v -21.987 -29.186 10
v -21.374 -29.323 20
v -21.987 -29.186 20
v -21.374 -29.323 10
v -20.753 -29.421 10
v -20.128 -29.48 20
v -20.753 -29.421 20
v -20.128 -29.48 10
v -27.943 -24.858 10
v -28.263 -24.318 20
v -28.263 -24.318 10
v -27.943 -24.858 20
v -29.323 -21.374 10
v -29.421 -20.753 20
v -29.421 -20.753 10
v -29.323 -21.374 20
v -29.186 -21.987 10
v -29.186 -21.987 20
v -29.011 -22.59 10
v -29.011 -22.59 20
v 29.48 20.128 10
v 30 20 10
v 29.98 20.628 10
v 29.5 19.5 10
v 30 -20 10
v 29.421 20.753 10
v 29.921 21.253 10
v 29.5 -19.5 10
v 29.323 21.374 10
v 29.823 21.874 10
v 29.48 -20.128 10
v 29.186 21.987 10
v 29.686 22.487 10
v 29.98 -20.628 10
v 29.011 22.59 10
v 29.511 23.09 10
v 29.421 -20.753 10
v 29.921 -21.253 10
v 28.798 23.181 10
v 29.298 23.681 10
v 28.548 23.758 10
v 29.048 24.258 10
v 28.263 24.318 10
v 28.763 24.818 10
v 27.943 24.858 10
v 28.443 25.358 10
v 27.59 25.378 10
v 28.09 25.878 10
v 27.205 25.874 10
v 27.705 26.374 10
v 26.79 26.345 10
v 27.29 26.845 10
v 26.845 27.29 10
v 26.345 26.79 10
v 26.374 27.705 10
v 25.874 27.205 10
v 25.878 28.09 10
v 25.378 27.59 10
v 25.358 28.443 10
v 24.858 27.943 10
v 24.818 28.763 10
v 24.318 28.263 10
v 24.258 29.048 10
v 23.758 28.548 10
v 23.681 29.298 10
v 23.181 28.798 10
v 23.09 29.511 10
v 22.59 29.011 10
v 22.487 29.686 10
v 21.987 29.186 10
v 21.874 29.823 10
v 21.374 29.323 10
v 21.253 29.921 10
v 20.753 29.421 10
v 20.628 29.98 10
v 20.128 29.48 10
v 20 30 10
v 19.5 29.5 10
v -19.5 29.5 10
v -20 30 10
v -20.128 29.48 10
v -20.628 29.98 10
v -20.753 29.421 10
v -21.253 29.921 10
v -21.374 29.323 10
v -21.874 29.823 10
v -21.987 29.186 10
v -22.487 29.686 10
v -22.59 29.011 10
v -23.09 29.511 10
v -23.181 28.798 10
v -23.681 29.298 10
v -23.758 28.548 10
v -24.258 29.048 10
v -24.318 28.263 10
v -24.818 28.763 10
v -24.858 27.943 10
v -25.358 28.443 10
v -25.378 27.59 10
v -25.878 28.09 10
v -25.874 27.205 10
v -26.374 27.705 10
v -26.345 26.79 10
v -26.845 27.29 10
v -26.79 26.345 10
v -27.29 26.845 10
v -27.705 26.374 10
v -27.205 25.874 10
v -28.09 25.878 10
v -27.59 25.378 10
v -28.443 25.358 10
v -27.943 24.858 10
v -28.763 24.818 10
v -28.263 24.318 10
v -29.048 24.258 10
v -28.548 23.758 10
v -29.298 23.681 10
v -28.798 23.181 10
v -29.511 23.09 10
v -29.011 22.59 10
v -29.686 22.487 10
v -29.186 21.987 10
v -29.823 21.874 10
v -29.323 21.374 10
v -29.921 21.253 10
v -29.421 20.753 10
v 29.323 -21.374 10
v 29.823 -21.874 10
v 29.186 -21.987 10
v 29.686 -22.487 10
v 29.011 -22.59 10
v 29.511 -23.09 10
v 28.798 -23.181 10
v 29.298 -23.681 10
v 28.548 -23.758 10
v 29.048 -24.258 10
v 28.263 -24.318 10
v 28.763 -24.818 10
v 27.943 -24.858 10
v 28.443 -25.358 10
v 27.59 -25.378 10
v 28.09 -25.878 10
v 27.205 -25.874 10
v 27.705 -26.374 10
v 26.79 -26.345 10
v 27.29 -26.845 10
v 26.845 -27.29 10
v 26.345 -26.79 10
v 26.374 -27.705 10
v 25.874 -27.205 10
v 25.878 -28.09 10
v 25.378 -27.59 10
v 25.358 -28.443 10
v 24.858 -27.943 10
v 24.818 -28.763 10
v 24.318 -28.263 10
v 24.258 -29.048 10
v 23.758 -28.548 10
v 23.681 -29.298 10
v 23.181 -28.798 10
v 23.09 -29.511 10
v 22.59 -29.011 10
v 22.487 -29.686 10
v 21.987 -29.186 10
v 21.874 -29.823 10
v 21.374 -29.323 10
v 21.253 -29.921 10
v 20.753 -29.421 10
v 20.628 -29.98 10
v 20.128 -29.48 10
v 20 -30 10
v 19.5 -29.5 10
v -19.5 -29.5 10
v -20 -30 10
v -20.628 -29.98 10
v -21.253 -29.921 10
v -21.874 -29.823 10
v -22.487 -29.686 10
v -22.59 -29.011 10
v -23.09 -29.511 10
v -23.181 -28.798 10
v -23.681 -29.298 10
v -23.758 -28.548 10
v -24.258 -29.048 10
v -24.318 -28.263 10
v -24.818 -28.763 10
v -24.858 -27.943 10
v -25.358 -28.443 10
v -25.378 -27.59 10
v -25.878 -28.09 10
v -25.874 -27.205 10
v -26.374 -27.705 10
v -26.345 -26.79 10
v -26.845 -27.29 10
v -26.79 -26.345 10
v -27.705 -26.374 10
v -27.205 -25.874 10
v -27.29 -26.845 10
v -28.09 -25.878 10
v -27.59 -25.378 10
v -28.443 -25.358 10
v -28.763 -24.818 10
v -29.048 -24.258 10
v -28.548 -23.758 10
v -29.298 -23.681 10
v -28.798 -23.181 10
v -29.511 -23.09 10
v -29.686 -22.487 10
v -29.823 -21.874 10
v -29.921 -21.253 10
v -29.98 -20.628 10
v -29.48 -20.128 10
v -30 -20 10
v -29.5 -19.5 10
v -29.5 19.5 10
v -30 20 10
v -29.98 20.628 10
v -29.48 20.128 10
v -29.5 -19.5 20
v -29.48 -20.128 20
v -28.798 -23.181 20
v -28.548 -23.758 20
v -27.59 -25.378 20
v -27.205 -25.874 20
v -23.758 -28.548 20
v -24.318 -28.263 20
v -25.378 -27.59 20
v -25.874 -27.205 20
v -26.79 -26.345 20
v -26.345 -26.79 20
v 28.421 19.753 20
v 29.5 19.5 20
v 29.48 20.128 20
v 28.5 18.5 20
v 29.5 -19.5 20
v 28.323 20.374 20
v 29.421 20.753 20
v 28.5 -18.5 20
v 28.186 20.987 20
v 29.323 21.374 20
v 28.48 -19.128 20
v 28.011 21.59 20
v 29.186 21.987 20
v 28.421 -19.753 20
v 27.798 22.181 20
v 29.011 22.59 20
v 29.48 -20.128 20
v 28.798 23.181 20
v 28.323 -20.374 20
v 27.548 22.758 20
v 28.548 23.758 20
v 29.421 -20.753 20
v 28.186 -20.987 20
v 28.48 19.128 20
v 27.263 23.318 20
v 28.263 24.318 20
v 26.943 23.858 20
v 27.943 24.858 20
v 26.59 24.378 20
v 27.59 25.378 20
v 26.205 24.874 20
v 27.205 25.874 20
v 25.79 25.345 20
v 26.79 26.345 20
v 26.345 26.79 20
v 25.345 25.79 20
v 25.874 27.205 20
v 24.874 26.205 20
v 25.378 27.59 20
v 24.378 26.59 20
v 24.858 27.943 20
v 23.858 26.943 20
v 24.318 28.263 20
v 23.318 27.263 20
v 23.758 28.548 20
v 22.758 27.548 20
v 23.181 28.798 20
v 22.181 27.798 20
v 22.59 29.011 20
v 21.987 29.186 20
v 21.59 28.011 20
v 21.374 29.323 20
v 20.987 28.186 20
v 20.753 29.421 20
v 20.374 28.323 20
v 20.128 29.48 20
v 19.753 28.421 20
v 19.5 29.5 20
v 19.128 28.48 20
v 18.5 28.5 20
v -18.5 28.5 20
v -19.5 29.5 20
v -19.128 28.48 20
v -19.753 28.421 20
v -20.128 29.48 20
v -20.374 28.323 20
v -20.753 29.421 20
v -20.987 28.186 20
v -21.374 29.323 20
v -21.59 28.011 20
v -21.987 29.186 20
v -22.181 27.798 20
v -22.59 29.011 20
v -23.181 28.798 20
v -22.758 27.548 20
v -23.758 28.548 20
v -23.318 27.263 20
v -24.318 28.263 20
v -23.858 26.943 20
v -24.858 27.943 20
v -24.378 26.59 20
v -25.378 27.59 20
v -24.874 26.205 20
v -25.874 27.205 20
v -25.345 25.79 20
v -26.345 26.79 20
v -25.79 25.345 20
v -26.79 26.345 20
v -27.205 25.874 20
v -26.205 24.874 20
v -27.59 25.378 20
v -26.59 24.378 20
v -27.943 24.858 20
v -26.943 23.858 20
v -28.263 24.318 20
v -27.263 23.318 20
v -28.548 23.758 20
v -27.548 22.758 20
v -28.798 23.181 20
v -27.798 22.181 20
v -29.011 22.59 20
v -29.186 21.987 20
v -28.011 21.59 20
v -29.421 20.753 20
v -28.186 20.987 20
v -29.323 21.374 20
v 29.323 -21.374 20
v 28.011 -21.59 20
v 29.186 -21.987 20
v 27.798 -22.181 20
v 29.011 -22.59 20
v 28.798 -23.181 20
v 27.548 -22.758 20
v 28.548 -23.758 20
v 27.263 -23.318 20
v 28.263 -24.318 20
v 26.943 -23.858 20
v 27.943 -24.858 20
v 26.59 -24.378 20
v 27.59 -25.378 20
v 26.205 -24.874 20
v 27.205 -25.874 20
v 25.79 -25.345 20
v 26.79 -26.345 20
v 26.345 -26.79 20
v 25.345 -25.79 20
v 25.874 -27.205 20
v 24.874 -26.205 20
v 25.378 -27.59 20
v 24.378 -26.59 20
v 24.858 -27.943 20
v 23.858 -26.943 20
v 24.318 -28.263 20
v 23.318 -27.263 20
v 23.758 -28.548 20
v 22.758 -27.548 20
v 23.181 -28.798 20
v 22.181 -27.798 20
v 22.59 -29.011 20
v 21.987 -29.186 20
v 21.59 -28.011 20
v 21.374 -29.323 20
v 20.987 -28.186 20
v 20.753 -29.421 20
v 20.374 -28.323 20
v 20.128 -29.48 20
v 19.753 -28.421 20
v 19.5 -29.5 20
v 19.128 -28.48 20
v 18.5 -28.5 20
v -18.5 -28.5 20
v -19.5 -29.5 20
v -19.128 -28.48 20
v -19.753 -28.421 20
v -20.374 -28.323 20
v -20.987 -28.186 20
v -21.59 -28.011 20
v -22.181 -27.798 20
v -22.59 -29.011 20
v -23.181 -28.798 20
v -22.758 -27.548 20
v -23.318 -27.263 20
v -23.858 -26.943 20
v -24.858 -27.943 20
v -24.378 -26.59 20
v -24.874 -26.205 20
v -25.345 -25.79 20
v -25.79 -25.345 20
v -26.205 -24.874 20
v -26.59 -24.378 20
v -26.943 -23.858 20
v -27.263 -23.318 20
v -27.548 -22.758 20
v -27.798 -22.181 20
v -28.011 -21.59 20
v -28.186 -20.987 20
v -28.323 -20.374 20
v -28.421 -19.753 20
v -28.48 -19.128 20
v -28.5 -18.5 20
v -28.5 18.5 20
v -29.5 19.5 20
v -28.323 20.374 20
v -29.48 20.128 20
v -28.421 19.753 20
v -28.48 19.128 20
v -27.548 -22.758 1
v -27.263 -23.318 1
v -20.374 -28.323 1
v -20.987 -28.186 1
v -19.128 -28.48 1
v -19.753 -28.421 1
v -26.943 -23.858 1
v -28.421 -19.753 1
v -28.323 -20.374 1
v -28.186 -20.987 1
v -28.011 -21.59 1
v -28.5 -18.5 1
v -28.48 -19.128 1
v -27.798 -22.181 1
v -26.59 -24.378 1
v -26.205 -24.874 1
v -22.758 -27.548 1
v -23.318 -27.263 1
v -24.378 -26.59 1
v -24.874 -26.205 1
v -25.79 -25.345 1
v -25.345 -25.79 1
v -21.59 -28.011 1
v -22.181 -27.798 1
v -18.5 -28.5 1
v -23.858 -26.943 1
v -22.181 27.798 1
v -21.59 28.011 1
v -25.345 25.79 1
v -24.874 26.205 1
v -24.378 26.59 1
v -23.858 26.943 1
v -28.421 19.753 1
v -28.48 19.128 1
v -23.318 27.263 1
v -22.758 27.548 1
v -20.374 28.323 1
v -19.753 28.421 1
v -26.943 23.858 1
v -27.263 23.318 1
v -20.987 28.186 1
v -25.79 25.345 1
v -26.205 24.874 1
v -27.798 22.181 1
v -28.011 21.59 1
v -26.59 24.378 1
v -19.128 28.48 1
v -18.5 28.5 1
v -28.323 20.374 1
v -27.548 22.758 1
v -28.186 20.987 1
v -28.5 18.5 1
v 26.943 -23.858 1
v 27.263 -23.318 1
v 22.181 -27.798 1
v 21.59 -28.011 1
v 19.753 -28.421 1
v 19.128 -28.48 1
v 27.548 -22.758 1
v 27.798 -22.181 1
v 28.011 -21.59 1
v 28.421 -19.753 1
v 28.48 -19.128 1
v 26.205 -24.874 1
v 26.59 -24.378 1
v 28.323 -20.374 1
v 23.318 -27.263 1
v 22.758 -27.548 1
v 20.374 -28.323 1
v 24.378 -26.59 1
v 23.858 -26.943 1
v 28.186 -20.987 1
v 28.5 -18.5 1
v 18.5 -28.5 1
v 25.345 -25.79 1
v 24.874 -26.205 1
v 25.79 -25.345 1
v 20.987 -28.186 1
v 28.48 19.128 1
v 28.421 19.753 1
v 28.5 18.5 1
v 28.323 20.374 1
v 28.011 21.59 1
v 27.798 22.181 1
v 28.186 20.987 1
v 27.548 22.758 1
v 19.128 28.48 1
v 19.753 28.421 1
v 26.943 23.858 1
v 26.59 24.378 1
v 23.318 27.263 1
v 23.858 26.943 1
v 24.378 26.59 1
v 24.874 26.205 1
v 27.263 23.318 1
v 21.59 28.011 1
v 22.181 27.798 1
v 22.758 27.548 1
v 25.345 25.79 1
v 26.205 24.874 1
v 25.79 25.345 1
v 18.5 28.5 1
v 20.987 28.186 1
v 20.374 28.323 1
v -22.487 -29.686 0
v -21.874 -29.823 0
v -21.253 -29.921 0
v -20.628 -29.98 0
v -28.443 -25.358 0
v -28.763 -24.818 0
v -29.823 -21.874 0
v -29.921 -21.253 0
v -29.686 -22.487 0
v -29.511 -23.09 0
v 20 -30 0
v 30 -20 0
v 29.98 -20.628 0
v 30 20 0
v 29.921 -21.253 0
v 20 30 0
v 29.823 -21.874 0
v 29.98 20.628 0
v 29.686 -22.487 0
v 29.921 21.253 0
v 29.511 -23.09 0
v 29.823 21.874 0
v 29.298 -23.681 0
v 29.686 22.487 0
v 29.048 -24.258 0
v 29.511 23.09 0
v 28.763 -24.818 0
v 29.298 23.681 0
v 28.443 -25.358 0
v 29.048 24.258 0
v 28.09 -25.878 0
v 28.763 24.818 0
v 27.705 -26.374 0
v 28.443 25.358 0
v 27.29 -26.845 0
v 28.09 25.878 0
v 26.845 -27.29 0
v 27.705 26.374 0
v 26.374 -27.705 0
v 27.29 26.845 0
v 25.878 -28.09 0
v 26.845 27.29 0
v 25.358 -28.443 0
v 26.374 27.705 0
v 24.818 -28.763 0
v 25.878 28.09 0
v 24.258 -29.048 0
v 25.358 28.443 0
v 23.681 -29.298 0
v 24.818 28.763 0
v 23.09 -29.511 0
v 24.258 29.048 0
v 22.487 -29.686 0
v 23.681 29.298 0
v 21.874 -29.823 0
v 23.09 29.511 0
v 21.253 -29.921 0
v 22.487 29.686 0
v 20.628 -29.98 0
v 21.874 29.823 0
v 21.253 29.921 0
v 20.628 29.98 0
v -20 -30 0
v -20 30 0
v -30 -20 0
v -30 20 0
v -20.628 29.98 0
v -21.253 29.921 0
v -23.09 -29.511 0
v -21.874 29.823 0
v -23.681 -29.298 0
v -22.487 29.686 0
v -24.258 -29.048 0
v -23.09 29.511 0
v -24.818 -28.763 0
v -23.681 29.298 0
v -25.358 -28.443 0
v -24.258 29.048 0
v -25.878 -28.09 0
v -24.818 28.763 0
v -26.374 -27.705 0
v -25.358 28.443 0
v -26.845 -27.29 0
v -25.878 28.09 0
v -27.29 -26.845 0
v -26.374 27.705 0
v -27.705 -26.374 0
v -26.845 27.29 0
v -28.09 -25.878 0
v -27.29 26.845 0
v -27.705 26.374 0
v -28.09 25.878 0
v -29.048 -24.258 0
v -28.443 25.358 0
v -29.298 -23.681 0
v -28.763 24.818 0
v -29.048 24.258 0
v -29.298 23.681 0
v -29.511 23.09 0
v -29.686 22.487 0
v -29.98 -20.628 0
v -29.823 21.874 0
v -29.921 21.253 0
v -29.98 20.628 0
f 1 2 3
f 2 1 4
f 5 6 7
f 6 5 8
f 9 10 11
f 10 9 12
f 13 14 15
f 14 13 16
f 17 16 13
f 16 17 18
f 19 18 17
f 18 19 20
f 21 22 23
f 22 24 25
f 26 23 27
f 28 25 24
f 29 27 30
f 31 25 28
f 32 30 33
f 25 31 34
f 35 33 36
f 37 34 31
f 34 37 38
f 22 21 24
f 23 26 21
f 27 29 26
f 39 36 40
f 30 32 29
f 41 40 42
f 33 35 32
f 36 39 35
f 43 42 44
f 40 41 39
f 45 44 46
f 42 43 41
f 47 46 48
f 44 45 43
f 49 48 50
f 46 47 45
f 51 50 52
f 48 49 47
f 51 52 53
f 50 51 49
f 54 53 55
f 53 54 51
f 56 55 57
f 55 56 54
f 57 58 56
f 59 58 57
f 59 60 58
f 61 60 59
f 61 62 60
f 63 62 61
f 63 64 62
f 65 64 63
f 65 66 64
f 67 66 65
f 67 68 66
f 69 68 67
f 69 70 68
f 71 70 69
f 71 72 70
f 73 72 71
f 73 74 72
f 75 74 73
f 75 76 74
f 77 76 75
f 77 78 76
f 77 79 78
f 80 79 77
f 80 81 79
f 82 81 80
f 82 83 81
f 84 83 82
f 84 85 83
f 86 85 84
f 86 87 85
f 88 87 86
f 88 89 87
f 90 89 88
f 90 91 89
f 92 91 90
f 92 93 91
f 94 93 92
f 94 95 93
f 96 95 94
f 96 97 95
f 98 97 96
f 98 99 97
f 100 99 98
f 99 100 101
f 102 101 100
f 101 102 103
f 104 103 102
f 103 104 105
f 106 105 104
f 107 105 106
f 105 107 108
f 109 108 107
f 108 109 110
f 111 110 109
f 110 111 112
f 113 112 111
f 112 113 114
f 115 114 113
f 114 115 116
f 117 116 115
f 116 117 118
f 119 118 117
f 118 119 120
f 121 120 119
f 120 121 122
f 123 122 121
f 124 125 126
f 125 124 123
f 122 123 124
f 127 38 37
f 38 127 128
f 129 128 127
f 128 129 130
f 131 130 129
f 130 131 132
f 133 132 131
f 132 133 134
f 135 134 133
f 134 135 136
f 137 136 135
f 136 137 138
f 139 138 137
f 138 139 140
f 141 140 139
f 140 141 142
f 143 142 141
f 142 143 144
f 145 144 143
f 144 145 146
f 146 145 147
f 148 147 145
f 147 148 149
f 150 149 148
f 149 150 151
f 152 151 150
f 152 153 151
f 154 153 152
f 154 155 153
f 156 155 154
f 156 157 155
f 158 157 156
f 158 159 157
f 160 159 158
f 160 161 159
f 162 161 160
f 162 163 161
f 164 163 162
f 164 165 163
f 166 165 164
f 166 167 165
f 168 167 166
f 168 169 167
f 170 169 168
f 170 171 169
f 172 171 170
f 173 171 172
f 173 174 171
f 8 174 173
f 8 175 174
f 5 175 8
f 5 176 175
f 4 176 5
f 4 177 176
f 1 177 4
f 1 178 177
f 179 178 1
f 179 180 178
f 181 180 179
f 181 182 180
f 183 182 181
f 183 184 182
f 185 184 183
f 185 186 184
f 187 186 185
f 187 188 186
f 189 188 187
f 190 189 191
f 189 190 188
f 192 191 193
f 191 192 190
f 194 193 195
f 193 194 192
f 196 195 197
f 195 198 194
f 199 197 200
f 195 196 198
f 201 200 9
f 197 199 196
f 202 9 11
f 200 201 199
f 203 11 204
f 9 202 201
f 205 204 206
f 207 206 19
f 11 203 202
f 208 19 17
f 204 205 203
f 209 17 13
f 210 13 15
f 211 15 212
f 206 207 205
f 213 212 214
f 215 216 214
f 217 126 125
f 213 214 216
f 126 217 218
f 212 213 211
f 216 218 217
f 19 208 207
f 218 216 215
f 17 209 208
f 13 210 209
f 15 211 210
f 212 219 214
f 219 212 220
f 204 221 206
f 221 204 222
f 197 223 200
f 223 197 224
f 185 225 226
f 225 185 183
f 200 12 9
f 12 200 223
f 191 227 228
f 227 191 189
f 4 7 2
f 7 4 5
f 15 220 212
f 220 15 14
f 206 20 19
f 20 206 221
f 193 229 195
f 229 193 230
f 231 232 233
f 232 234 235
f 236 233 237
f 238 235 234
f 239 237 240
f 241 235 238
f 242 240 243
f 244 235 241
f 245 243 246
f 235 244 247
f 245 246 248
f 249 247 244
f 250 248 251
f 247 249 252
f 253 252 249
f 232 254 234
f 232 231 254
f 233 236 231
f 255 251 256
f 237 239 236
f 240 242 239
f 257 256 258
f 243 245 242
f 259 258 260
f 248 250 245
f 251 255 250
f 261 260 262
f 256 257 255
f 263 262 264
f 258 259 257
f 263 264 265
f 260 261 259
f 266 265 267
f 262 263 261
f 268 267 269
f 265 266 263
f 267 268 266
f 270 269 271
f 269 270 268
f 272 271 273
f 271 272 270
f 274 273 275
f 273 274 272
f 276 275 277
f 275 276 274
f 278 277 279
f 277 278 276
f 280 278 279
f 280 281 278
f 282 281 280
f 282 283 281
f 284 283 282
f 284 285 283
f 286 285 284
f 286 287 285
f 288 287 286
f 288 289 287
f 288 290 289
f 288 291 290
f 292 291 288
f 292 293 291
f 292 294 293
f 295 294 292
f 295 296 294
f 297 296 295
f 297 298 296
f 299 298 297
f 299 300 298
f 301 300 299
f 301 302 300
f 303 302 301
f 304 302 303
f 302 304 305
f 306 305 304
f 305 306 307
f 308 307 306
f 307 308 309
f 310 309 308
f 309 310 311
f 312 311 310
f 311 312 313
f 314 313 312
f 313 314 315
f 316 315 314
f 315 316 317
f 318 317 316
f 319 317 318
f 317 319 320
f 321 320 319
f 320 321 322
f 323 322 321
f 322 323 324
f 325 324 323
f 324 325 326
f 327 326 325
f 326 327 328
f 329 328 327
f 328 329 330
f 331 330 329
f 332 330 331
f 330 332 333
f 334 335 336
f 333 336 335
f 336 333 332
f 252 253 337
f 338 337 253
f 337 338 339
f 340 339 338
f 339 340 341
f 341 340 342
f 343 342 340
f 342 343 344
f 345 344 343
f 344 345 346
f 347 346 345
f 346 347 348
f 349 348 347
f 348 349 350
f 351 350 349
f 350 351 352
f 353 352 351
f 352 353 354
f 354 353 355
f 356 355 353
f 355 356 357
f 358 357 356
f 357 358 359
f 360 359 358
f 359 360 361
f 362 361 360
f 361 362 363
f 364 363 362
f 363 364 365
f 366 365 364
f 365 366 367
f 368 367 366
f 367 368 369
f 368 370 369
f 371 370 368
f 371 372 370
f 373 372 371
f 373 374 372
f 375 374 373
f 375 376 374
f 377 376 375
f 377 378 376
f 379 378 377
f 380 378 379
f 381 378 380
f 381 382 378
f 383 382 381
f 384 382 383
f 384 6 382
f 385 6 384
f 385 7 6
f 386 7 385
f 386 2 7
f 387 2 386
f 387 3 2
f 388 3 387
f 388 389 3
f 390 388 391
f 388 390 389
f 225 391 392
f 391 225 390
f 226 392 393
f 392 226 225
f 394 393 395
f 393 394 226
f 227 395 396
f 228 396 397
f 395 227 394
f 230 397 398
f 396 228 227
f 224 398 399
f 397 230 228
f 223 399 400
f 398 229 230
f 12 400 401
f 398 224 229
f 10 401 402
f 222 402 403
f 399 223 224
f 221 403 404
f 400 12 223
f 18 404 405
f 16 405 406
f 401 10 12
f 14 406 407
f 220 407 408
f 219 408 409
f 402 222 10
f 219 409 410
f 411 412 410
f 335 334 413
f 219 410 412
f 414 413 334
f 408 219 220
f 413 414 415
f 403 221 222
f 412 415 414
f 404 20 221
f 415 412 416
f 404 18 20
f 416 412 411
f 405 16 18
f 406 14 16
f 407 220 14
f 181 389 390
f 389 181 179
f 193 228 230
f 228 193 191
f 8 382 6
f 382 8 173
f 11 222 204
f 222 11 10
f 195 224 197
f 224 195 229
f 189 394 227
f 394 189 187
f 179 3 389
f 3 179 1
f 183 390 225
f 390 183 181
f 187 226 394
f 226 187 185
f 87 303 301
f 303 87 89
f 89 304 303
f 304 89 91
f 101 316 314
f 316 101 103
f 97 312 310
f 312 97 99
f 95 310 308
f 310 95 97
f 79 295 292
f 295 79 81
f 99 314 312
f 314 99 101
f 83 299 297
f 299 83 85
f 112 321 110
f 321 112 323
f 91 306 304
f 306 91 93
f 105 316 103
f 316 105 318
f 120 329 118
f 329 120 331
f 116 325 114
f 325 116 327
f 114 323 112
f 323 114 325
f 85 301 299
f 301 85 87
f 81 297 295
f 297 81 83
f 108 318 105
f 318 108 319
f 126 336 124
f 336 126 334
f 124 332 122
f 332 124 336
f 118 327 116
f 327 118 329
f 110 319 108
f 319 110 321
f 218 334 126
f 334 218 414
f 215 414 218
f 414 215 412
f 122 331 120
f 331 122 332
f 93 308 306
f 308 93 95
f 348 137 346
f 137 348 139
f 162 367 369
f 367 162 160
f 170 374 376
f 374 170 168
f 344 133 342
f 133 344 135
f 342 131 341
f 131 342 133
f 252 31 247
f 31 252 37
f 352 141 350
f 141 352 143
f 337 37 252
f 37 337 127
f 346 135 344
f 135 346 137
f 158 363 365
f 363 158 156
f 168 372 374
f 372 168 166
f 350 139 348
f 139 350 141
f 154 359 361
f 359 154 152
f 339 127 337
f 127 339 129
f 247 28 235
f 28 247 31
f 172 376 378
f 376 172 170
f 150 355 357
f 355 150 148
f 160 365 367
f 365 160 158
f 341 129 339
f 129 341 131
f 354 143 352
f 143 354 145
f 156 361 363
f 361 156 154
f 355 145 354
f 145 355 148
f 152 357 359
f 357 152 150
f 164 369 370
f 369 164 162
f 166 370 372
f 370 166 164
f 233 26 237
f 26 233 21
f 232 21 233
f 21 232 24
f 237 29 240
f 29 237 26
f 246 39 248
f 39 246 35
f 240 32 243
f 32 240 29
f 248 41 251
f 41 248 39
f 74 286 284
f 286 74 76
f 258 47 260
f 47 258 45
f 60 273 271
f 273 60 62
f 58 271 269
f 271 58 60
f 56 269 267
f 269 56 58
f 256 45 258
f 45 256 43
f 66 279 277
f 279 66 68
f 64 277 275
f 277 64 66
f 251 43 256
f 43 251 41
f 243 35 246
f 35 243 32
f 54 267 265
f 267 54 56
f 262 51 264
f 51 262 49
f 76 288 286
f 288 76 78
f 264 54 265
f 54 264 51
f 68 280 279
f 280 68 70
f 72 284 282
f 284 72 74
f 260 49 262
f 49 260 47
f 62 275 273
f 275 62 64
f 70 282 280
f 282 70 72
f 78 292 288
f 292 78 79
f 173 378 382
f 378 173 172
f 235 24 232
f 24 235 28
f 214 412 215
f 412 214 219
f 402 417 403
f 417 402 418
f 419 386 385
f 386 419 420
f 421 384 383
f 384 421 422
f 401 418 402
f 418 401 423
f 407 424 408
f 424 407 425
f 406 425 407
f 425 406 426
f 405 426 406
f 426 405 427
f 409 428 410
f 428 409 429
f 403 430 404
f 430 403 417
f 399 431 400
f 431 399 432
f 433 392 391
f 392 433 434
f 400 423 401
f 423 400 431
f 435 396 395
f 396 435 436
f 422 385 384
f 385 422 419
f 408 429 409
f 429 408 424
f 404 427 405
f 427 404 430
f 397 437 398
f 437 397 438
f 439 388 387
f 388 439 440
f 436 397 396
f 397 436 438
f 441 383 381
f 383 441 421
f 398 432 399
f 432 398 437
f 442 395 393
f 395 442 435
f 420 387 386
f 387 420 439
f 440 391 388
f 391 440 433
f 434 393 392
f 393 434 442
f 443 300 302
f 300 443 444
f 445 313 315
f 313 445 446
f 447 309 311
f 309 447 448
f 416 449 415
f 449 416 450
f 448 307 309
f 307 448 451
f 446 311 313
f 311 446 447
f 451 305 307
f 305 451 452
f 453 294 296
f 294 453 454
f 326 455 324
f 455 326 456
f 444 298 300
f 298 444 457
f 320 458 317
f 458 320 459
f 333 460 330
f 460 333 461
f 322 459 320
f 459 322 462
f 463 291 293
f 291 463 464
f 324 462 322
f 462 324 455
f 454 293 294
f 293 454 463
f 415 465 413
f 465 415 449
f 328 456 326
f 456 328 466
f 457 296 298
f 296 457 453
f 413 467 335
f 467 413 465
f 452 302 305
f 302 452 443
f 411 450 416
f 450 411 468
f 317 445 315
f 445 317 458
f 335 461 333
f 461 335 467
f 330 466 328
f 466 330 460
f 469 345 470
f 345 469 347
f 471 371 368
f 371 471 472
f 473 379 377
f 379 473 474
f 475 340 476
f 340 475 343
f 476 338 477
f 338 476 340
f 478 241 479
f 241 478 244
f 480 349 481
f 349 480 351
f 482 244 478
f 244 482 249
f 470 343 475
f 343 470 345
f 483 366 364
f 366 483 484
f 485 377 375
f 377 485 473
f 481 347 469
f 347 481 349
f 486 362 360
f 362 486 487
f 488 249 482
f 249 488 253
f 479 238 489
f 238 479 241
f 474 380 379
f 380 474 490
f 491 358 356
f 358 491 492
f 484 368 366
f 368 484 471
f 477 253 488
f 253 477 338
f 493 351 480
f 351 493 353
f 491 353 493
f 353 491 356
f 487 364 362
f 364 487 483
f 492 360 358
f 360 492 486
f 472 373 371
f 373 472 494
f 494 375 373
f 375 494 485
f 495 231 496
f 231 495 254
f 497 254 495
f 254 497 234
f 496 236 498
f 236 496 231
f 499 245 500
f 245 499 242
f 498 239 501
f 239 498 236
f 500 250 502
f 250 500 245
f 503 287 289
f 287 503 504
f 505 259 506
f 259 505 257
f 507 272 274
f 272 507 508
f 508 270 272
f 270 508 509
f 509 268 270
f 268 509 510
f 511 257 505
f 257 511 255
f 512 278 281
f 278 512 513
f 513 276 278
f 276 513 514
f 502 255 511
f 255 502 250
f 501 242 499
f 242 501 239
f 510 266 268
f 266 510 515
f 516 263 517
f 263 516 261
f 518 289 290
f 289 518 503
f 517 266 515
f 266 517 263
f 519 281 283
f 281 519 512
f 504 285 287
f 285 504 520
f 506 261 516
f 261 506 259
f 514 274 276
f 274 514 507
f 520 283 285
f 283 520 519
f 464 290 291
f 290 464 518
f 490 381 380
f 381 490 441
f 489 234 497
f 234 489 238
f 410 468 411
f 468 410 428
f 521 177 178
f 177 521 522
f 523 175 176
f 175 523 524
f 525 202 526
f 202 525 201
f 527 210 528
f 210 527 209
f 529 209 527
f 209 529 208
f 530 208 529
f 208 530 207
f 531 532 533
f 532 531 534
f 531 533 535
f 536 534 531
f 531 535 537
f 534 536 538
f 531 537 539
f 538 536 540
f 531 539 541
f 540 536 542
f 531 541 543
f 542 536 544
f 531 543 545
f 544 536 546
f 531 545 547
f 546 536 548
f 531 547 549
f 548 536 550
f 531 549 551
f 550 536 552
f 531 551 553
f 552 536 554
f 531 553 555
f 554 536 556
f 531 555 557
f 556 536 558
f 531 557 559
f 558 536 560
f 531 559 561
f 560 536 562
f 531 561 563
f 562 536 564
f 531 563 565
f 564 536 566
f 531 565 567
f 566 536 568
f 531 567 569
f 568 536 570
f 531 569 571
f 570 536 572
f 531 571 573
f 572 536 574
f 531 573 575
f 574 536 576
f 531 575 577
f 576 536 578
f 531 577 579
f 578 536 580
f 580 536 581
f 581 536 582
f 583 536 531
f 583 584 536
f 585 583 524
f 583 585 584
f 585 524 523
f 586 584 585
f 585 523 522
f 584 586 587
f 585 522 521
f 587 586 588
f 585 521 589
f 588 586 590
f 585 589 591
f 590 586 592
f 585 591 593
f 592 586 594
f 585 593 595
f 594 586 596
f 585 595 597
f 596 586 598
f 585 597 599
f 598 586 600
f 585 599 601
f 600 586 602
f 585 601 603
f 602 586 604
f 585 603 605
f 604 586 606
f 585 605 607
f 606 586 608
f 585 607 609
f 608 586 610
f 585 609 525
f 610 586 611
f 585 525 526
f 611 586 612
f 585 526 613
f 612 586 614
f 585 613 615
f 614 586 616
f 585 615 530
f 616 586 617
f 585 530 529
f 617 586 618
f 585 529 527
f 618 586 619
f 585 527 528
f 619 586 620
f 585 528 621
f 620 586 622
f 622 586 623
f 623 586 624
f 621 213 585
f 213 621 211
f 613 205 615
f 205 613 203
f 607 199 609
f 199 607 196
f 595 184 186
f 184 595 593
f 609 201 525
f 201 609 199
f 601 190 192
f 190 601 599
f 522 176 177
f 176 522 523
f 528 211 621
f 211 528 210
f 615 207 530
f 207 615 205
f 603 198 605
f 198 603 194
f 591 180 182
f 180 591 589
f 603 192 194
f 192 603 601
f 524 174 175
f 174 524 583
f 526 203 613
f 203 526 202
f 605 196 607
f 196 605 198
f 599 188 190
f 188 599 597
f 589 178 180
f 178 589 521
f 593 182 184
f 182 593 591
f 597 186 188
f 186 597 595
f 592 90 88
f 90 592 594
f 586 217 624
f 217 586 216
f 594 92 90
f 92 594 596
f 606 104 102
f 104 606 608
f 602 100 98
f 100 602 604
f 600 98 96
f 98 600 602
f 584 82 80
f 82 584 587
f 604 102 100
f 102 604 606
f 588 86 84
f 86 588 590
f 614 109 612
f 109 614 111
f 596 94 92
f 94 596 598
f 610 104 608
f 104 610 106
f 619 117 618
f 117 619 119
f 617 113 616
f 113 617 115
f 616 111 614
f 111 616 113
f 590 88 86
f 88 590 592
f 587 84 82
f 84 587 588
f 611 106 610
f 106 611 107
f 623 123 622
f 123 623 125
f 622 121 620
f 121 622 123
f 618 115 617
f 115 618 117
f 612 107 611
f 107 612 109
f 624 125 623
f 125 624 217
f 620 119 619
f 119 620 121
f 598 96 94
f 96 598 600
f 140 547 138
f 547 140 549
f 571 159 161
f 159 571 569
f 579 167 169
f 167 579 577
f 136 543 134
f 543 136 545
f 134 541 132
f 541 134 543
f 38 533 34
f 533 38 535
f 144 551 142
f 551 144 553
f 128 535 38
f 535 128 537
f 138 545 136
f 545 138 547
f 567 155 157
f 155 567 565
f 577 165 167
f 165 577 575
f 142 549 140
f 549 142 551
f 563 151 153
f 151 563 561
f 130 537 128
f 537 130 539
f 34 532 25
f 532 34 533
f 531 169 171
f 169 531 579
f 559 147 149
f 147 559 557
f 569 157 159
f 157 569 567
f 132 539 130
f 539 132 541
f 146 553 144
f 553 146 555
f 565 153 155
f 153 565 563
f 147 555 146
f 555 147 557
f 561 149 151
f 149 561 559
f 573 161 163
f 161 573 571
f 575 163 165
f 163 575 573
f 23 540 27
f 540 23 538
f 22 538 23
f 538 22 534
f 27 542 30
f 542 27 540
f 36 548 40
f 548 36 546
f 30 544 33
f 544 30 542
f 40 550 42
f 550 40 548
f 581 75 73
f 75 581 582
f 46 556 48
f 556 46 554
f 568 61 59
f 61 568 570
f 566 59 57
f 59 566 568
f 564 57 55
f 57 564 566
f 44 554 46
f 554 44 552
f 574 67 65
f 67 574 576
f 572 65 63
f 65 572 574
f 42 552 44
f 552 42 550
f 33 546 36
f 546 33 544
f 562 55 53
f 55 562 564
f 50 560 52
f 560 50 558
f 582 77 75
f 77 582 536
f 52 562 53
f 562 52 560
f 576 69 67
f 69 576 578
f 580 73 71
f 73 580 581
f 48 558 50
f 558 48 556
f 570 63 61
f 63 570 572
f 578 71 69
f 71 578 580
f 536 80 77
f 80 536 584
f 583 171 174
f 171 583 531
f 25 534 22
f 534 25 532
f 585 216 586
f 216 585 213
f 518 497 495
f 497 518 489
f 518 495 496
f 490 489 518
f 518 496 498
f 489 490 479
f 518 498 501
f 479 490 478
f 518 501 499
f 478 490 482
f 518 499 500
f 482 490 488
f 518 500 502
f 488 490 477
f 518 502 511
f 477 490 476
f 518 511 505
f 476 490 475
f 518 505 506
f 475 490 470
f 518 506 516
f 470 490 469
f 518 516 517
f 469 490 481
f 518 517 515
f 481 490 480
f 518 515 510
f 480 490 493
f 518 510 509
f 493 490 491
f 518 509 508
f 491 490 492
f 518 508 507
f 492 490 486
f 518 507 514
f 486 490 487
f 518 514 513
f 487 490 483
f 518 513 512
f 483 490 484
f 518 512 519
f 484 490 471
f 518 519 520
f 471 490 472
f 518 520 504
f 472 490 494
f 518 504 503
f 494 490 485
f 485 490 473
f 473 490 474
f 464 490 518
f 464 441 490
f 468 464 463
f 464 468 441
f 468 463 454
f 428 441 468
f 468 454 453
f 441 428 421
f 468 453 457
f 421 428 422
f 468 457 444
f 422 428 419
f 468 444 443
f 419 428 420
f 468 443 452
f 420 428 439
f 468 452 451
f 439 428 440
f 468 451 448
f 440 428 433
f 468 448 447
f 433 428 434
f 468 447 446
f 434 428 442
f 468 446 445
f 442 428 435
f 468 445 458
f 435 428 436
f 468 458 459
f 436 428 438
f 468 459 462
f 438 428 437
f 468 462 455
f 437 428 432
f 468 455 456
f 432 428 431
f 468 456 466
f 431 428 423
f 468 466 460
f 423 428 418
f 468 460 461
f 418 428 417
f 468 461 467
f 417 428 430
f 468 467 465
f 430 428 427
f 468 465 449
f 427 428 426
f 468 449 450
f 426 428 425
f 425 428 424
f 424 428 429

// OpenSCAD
/* Time_cube.scad
October, 2016
Albert Phan

This is the time cube housing. This time management device uses a RGB LED and gently fades between two colors over a period of time.

*/
$fn=100;
include <MCAD/boxes.scad>

inBoxLength = 60;
inBoxWidth = 60; 
inBoxHeight = 70;
radiusBox = 10;

baseHeight = 10;
baseLipHeight = 10;
bottomThickness = 1.0;

nozz = 1.0;// Nozzle Diameter
nozz2 = 2 * nozz;
nozz3 = 3 * nozz;
part = "base";	// base or top or both

if (part == "top")
{
// Top
translate([0,0,inBoxHeight/4])
	roundedBox([inBoxLength, inBoxWidth, inBoxHeight/2], radiusBox);
	translate([0,0,inBoxHeight/2])
roundedBox([inBoxLength, inBoxWidth, inBoxHeight/2], radiusBox, true);
}
else if(part == "base")
{
	// Lip to hold the Top
	translate([0,0,baseHeight + baseLipHeight/2])
		difference()
		{
			roundedBox([inBoxLength - nozz, inBoxWidth - nozz, baseLipHeight], radiusBox, true);
			roundedBox([inBoxLength - nozz3, inBoxWidth - nozz3, baseLipHeight + 0.1], radiusBox, true);
		}
	// Base
	translate([0,0, baseHeight/2])
		difference()
		{
			roundedBox([inBoxLength, inBoxWidth, baseHeight], radiusBox, true);
			roundedBox([inBoxLength - nozz3, inBoxWidth - nozz3, baseLipHeight + 0.1], radiusBox, true);
		}
	// Bottom of base
	translate([0,0, bottomThickness/2])
		roundedBox([inBoxLength, inBoxWidth, bottomThickness], radiusBox, true);
}

module timeCubeTop(inBoxLength, inBoxWidth, inBoxHeight, radiusBox, nozz)
{	
	
}
